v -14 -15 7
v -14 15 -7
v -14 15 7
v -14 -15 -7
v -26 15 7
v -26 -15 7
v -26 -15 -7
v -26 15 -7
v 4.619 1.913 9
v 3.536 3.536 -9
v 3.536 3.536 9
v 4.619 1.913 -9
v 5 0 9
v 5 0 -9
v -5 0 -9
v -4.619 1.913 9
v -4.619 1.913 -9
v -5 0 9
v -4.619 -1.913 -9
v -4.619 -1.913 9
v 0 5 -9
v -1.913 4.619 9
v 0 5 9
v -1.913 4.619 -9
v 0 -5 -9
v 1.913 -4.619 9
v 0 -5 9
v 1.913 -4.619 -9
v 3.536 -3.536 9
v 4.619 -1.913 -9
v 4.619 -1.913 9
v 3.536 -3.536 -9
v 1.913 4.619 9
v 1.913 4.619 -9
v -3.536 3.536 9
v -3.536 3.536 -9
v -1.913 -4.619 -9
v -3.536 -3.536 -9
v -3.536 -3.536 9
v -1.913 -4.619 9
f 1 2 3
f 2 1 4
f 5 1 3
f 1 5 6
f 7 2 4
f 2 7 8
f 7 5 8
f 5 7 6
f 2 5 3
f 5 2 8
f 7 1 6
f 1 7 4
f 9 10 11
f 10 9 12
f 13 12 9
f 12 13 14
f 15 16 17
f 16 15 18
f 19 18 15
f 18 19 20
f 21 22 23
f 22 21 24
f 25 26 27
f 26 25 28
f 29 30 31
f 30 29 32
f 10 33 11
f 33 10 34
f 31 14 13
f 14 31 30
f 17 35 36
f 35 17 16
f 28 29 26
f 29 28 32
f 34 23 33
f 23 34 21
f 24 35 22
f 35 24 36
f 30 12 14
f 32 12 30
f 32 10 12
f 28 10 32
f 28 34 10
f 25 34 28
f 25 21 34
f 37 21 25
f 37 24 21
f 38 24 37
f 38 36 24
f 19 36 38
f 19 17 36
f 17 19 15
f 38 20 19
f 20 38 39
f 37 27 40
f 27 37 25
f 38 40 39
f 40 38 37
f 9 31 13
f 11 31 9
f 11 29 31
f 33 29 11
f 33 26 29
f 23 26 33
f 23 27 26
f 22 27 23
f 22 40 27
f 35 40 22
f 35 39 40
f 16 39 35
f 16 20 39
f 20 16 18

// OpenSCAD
union(){
  translate([-20, 0, 0]) cube([12, 30, 14], center=true);
  translate([0, 0, 0]) cylinder(h=18, r1=5, r2=5, center=true);
}
